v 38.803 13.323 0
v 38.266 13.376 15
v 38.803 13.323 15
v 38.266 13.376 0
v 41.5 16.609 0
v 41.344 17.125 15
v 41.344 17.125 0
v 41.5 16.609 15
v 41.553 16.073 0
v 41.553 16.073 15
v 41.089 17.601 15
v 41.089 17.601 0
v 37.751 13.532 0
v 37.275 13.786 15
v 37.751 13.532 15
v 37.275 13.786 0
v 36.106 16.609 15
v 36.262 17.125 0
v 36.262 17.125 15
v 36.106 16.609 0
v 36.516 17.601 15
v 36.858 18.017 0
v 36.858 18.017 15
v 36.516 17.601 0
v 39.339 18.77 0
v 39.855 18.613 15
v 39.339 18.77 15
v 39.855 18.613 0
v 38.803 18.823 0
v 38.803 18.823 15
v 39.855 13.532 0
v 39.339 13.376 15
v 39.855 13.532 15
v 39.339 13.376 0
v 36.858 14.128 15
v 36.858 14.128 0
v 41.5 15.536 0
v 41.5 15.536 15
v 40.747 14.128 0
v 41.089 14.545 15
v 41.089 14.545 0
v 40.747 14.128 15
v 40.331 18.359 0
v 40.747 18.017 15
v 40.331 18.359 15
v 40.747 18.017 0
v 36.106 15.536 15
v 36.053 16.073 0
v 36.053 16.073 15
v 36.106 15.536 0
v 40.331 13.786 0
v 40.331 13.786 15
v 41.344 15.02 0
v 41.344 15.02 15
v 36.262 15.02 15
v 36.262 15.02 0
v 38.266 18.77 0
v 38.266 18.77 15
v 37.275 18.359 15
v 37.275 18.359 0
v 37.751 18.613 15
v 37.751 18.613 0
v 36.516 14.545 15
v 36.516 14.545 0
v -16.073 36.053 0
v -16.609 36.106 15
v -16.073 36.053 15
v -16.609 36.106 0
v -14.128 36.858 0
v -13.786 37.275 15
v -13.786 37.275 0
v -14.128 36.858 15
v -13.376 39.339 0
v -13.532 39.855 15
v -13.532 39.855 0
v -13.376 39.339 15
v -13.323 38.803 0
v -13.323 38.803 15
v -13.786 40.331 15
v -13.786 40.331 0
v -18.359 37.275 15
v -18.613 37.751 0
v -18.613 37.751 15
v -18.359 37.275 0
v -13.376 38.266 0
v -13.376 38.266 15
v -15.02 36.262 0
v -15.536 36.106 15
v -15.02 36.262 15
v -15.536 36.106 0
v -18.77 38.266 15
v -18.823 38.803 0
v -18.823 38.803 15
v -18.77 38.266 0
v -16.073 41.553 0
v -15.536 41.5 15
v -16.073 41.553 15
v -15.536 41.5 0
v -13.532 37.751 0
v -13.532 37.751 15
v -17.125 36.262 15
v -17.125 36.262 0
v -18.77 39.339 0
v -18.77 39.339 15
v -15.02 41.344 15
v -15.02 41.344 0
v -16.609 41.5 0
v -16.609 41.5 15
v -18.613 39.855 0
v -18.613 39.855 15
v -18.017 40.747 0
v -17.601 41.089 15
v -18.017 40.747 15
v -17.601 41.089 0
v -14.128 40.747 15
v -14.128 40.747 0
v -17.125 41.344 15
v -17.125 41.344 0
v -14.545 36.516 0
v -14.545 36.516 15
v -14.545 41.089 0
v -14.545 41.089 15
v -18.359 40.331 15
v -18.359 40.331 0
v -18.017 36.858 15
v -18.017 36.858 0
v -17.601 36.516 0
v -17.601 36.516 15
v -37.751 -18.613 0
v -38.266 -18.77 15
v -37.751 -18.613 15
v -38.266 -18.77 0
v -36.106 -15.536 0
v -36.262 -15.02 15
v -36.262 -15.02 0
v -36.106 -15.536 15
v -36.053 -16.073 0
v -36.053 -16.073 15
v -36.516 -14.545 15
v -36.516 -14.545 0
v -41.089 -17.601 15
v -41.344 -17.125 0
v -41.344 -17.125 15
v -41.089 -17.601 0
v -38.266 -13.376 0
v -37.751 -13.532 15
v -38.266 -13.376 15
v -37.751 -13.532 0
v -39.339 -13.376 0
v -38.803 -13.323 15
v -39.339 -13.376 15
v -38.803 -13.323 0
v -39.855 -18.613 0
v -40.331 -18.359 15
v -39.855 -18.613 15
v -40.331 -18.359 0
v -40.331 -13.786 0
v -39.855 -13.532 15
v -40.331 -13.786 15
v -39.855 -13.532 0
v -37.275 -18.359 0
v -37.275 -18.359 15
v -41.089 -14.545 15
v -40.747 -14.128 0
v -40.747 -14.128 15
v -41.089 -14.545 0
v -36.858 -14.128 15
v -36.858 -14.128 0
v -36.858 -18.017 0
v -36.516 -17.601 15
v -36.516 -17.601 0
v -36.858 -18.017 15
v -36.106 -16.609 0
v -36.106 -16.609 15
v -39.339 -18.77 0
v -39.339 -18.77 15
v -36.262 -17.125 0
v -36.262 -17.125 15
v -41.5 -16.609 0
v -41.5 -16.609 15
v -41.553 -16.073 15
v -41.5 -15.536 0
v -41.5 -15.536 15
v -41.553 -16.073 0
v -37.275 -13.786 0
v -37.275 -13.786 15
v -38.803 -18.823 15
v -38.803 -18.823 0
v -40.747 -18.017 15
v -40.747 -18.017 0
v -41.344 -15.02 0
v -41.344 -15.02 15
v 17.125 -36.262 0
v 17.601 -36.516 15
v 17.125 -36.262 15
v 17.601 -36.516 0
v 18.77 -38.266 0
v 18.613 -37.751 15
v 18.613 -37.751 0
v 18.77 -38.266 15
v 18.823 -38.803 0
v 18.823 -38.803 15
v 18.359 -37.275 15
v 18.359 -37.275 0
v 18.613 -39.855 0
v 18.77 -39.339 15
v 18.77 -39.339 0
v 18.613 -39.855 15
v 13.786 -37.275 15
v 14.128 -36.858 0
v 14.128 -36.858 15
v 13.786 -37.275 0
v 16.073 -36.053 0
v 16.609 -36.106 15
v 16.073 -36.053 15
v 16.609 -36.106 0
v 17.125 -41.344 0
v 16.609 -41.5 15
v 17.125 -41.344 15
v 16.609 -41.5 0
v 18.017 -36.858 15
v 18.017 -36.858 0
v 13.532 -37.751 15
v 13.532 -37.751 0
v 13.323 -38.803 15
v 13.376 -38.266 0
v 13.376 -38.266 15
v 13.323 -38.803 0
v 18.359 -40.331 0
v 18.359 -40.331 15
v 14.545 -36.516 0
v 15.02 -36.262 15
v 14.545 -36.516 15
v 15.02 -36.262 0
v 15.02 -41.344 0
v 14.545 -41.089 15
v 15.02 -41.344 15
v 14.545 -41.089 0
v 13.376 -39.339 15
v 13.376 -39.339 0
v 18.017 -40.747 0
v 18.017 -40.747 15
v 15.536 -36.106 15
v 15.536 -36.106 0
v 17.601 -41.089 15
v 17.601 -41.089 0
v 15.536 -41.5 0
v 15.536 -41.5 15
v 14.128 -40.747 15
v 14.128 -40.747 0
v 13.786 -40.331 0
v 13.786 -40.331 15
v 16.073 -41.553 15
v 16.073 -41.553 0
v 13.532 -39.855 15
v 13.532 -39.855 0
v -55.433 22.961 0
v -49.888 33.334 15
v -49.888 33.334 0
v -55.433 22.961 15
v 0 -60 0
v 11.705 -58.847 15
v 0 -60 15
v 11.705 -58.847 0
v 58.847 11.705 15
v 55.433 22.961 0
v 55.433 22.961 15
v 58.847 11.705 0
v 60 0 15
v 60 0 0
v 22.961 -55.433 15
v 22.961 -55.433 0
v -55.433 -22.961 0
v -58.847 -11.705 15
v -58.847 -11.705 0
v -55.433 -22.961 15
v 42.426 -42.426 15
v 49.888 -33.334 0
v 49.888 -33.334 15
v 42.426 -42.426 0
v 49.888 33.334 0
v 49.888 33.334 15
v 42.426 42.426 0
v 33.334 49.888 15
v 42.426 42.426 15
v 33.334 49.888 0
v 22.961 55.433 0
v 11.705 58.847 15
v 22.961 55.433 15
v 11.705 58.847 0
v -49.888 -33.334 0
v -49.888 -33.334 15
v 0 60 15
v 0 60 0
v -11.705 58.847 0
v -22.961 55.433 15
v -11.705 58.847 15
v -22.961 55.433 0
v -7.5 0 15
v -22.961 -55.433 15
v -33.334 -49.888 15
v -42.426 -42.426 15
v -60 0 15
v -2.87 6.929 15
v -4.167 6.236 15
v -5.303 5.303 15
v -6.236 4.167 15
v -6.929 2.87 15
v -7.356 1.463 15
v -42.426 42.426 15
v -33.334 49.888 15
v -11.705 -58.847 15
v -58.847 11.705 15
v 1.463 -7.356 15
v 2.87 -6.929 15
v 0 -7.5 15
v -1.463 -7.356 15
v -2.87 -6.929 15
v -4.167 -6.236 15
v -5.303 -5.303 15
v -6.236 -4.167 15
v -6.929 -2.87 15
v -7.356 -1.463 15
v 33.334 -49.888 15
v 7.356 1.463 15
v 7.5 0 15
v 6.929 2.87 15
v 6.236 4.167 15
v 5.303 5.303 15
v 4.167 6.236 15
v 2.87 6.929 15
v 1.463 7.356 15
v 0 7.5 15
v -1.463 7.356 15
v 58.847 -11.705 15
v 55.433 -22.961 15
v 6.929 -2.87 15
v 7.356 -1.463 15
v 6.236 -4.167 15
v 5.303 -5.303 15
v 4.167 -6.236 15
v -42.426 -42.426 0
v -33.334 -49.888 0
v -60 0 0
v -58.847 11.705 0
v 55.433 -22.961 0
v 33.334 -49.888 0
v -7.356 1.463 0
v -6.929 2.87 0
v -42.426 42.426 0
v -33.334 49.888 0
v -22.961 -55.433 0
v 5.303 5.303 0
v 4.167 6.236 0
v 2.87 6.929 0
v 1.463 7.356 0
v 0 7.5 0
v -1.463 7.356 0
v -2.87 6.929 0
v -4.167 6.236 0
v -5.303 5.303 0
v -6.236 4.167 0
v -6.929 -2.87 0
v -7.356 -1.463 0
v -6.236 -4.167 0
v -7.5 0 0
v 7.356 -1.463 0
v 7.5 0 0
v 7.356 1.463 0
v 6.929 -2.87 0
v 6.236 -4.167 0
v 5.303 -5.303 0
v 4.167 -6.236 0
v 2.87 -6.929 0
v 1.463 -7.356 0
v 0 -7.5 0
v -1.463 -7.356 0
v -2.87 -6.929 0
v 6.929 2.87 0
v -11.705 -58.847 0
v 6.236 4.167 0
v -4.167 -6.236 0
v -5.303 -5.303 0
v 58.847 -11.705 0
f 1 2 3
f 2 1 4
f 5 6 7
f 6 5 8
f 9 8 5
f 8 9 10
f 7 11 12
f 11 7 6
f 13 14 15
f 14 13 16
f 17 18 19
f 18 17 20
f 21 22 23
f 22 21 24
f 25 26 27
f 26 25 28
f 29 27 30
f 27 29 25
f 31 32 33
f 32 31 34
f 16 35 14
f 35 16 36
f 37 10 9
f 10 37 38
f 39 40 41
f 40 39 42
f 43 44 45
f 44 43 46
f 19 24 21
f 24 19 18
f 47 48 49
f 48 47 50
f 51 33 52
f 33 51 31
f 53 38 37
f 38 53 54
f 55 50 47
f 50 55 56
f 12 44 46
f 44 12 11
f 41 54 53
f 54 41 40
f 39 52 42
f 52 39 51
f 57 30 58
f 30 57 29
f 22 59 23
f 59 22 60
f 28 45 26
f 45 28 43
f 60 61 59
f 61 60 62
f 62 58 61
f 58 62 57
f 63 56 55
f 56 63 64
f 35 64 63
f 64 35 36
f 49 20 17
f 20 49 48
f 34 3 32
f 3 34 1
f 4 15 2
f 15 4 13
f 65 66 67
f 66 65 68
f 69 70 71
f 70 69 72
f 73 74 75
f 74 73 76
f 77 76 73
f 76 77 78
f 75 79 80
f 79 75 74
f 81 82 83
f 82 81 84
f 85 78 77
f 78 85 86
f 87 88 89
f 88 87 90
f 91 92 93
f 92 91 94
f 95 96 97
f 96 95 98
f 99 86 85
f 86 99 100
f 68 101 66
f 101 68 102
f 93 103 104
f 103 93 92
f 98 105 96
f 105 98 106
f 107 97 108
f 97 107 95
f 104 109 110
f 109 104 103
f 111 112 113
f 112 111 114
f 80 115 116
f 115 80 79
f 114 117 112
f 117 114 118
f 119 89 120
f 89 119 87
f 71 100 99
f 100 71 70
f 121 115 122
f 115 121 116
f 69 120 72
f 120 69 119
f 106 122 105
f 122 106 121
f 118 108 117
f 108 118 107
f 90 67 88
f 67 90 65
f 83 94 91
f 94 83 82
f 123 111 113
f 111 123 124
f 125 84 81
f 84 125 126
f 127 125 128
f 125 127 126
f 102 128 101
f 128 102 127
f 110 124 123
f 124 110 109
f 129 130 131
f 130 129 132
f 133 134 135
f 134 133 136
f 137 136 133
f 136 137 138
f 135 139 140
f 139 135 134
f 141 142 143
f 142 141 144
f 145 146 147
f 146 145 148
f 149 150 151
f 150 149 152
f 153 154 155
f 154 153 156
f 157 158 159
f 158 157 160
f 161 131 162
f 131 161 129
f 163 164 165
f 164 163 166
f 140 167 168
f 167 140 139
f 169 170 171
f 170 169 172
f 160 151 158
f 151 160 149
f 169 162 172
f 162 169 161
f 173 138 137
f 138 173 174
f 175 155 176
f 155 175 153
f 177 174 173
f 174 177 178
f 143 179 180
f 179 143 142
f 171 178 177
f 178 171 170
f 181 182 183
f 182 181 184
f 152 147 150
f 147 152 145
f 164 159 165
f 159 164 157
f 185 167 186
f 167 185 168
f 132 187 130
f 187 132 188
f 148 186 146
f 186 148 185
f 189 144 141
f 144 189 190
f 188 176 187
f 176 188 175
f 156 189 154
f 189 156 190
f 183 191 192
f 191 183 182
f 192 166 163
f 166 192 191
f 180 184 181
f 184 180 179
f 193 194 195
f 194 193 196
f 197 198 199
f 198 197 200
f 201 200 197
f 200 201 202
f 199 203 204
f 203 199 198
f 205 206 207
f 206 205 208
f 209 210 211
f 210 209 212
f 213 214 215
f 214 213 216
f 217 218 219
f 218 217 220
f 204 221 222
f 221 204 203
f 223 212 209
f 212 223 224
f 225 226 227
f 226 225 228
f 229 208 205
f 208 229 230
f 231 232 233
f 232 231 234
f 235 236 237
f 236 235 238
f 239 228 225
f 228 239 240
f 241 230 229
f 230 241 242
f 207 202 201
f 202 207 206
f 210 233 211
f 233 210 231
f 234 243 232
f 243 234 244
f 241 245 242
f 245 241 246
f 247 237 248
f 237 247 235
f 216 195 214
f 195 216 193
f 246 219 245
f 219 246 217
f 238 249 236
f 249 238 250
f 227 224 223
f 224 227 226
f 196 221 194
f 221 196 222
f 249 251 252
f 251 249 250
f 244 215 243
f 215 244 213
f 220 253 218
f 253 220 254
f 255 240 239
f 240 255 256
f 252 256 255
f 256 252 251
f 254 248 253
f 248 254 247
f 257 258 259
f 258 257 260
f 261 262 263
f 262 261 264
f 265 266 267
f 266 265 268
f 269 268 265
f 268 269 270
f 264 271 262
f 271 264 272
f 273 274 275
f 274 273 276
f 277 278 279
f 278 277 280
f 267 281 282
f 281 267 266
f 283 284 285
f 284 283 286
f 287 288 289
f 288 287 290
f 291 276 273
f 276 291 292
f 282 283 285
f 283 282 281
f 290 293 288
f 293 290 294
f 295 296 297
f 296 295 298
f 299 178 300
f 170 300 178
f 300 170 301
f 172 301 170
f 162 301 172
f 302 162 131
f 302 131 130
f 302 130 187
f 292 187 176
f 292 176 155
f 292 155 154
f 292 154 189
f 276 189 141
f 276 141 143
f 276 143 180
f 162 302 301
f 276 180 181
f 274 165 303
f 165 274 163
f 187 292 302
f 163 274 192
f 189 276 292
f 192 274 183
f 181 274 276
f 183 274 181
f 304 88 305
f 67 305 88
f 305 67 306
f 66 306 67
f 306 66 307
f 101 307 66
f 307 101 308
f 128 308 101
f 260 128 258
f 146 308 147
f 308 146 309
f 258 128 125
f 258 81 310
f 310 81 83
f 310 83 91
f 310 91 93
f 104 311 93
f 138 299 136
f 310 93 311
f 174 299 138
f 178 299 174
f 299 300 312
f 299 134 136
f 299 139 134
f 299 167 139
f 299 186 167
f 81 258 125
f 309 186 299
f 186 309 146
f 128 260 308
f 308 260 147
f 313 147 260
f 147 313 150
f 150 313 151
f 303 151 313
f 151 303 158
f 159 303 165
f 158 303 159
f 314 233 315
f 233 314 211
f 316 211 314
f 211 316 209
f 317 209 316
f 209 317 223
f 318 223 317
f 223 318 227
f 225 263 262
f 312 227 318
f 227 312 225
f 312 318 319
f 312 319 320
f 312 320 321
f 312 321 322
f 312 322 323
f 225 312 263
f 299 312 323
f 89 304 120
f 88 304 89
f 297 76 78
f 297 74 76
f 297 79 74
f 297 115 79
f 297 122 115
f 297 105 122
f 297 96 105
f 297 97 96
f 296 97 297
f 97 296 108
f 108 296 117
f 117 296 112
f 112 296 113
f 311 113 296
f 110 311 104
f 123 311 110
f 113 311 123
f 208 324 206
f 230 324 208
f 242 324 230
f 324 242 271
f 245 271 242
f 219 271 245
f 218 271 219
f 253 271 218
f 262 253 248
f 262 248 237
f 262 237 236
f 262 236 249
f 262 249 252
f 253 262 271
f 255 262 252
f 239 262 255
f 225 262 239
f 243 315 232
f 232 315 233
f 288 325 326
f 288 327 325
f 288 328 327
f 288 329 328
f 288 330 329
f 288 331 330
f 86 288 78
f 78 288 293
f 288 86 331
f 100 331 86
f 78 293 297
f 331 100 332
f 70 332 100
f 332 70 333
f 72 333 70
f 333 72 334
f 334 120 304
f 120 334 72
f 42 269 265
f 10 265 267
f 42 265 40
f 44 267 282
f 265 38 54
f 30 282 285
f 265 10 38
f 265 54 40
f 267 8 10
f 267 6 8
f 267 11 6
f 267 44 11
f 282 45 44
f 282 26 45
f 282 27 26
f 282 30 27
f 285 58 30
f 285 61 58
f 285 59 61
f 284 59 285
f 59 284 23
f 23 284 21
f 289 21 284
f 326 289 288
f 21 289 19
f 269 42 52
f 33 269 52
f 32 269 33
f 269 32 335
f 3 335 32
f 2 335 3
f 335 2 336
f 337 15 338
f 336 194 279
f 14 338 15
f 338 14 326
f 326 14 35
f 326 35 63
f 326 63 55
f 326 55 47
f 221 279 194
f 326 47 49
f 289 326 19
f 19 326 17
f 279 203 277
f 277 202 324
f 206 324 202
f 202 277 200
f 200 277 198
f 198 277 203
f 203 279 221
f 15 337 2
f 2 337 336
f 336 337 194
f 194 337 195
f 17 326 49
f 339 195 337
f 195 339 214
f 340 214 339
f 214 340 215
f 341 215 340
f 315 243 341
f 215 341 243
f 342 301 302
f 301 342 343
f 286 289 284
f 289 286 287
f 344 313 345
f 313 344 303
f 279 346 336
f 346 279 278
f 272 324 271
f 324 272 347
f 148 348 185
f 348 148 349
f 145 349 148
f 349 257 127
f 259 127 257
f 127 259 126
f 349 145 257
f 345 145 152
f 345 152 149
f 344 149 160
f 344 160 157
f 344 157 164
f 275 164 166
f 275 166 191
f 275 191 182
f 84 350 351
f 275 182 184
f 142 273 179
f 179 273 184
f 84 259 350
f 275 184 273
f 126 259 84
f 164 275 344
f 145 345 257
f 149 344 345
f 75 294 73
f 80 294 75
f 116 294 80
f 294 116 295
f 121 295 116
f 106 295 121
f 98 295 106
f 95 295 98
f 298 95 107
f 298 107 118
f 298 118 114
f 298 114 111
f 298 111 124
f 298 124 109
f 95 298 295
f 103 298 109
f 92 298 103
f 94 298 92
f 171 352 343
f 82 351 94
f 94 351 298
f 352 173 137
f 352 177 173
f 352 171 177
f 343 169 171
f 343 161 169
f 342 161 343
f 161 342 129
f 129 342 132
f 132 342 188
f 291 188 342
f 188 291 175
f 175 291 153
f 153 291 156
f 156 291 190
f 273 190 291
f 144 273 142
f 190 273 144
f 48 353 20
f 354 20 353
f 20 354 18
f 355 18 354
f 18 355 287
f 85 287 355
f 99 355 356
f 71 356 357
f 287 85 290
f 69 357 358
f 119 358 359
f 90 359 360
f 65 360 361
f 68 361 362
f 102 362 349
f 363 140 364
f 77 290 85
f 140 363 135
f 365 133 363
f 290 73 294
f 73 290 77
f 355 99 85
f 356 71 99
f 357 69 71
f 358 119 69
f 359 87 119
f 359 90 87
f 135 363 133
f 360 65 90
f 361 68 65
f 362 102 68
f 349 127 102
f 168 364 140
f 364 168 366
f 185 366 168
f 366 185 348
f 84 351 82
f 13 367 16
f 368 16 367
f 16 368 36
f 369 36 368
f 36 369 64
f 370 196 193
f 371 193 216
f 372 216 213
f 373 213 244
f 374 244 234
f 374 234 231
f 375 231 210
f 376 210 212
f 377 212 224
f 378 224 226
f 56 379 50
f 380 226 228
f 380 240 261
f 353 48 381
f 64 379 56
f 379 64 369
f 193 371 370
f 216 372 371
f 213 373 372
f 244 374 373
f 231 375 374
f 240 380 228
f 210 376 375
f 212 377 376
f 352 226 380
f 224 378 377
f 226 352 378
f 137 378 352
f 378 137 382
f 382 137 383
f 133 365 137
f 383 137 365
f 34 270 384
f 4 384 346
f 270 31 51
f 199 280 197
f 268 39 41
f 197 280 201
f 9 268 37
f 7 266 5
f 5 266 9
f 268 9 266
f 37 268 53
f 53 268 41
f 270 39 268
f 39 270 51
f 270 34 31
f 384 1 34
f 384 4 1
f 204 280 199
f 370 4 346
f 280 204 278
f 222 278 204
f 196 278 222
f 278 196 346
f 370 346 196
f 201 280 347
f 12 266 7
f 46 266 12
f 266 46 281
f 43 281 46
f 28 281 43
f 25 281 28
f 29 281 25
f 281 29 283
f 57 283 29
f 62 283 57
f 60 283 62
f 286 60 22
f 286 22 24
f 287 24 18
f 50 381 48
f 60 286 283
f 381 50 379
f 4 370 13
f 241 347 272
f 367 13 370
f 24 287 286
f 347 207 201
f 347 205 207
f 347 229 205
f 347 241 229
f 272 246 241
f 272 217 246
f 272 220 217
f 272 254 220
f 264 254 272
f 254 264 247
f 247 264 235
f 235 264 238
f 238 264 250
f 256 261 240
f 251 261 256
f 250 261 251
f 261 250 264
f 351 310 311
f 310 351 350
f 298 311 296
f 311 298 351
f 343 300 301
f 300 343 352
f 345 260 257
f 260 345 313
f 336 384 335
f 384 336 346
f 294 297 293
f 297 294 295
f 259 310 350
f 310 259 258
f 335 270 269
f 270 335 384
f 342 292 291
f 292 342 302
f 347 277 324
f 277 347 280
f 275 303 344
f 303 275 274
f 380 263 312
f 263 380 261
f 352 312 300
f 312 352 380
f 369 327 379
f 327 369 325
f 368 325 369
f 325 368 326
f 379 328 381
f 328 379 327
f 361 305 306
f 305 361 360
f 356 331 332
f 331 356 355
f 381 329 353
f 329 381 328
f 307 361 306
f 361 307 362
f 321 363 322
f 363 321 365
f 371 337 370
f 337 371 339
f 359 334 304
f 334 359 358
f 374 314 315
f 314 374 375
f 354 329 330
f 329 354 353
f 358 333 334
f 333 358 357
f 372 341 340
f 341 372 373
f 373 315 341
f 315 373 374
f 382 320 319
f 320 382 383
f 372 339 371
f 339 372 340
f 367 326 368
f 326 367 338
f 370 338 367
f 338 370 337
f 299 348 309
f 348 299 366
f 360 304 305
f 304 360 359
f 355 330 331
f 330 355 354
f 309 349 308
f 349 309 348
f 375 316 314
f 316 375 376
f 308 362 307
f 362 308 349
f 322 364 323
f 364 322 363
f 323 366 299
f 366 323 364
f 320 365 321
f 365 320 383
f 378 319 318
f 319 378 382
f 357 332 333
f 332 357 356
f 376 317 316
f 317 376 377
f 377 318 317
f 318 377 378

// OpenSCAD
$fn = 32;

// ----------------------------------------------------------------------
// Flange Ø120 x 15
// 4 holes on a Ø84 bolt circle, bolted joints
// ----------------------------------------------------------------------

// --- parameters (mm) ---
flange_d = 120;    // outside diameter of the flange
thickness = 15;    // flange thickness
holes = 4;         // number of bolt holes
pcd = 84;          // bolt circle diameter
start_deg = 22.5;  // angle of the first hole, from +X
hole_d = 5.5;      // bolt hole diameter
bore_d = 15;       // central through bore
hub_d = 23;        // hub outside diameter
hub_h = 0;         // hub height above the flange face (0 = no hub)

// --- derived feature positions (mm) ---
height = thickness + hub_h;  // = 15   overall height of the part
pcd_r = pcd / 2;             // = 42   bolt circle radius
hole_step = 360 / holes;     // = 90   angular pitch
feature_centers = [
  [pcd_r * cos(start_deg + 0 * hole_step), pcd_r * sin(start_deg + 0 * hole_step)],
  [pcd_r * cos(start_deg + 1 * hole_step), pcd_r * sin(start_deg + 1 * hole_step)],
  [pcd_r * cos(start_deg + 2 * hole_step), pcd_r * sin(start_deg + 2 * hole_step)],
  [pcd_r * cos(start_deg + 3 * hole_step), pcd_r * sin(start_deg + 3 * hole_step)]
];   // bolt hole centres on the pitch circle

// flange disc, every hole and the bore cut straight through
difference() {
  union() {
    cylinder(d = flange_d, h = thickness);
  }
  translate([0, 0, -1]) cylinder(d = bore_d, h = height + 2);  // bore, through
  for (centre = feature_centers)
    translate([centre[0], centre[1], -1]) cylinder(d = hole_d, h = thickness + 2);
}
